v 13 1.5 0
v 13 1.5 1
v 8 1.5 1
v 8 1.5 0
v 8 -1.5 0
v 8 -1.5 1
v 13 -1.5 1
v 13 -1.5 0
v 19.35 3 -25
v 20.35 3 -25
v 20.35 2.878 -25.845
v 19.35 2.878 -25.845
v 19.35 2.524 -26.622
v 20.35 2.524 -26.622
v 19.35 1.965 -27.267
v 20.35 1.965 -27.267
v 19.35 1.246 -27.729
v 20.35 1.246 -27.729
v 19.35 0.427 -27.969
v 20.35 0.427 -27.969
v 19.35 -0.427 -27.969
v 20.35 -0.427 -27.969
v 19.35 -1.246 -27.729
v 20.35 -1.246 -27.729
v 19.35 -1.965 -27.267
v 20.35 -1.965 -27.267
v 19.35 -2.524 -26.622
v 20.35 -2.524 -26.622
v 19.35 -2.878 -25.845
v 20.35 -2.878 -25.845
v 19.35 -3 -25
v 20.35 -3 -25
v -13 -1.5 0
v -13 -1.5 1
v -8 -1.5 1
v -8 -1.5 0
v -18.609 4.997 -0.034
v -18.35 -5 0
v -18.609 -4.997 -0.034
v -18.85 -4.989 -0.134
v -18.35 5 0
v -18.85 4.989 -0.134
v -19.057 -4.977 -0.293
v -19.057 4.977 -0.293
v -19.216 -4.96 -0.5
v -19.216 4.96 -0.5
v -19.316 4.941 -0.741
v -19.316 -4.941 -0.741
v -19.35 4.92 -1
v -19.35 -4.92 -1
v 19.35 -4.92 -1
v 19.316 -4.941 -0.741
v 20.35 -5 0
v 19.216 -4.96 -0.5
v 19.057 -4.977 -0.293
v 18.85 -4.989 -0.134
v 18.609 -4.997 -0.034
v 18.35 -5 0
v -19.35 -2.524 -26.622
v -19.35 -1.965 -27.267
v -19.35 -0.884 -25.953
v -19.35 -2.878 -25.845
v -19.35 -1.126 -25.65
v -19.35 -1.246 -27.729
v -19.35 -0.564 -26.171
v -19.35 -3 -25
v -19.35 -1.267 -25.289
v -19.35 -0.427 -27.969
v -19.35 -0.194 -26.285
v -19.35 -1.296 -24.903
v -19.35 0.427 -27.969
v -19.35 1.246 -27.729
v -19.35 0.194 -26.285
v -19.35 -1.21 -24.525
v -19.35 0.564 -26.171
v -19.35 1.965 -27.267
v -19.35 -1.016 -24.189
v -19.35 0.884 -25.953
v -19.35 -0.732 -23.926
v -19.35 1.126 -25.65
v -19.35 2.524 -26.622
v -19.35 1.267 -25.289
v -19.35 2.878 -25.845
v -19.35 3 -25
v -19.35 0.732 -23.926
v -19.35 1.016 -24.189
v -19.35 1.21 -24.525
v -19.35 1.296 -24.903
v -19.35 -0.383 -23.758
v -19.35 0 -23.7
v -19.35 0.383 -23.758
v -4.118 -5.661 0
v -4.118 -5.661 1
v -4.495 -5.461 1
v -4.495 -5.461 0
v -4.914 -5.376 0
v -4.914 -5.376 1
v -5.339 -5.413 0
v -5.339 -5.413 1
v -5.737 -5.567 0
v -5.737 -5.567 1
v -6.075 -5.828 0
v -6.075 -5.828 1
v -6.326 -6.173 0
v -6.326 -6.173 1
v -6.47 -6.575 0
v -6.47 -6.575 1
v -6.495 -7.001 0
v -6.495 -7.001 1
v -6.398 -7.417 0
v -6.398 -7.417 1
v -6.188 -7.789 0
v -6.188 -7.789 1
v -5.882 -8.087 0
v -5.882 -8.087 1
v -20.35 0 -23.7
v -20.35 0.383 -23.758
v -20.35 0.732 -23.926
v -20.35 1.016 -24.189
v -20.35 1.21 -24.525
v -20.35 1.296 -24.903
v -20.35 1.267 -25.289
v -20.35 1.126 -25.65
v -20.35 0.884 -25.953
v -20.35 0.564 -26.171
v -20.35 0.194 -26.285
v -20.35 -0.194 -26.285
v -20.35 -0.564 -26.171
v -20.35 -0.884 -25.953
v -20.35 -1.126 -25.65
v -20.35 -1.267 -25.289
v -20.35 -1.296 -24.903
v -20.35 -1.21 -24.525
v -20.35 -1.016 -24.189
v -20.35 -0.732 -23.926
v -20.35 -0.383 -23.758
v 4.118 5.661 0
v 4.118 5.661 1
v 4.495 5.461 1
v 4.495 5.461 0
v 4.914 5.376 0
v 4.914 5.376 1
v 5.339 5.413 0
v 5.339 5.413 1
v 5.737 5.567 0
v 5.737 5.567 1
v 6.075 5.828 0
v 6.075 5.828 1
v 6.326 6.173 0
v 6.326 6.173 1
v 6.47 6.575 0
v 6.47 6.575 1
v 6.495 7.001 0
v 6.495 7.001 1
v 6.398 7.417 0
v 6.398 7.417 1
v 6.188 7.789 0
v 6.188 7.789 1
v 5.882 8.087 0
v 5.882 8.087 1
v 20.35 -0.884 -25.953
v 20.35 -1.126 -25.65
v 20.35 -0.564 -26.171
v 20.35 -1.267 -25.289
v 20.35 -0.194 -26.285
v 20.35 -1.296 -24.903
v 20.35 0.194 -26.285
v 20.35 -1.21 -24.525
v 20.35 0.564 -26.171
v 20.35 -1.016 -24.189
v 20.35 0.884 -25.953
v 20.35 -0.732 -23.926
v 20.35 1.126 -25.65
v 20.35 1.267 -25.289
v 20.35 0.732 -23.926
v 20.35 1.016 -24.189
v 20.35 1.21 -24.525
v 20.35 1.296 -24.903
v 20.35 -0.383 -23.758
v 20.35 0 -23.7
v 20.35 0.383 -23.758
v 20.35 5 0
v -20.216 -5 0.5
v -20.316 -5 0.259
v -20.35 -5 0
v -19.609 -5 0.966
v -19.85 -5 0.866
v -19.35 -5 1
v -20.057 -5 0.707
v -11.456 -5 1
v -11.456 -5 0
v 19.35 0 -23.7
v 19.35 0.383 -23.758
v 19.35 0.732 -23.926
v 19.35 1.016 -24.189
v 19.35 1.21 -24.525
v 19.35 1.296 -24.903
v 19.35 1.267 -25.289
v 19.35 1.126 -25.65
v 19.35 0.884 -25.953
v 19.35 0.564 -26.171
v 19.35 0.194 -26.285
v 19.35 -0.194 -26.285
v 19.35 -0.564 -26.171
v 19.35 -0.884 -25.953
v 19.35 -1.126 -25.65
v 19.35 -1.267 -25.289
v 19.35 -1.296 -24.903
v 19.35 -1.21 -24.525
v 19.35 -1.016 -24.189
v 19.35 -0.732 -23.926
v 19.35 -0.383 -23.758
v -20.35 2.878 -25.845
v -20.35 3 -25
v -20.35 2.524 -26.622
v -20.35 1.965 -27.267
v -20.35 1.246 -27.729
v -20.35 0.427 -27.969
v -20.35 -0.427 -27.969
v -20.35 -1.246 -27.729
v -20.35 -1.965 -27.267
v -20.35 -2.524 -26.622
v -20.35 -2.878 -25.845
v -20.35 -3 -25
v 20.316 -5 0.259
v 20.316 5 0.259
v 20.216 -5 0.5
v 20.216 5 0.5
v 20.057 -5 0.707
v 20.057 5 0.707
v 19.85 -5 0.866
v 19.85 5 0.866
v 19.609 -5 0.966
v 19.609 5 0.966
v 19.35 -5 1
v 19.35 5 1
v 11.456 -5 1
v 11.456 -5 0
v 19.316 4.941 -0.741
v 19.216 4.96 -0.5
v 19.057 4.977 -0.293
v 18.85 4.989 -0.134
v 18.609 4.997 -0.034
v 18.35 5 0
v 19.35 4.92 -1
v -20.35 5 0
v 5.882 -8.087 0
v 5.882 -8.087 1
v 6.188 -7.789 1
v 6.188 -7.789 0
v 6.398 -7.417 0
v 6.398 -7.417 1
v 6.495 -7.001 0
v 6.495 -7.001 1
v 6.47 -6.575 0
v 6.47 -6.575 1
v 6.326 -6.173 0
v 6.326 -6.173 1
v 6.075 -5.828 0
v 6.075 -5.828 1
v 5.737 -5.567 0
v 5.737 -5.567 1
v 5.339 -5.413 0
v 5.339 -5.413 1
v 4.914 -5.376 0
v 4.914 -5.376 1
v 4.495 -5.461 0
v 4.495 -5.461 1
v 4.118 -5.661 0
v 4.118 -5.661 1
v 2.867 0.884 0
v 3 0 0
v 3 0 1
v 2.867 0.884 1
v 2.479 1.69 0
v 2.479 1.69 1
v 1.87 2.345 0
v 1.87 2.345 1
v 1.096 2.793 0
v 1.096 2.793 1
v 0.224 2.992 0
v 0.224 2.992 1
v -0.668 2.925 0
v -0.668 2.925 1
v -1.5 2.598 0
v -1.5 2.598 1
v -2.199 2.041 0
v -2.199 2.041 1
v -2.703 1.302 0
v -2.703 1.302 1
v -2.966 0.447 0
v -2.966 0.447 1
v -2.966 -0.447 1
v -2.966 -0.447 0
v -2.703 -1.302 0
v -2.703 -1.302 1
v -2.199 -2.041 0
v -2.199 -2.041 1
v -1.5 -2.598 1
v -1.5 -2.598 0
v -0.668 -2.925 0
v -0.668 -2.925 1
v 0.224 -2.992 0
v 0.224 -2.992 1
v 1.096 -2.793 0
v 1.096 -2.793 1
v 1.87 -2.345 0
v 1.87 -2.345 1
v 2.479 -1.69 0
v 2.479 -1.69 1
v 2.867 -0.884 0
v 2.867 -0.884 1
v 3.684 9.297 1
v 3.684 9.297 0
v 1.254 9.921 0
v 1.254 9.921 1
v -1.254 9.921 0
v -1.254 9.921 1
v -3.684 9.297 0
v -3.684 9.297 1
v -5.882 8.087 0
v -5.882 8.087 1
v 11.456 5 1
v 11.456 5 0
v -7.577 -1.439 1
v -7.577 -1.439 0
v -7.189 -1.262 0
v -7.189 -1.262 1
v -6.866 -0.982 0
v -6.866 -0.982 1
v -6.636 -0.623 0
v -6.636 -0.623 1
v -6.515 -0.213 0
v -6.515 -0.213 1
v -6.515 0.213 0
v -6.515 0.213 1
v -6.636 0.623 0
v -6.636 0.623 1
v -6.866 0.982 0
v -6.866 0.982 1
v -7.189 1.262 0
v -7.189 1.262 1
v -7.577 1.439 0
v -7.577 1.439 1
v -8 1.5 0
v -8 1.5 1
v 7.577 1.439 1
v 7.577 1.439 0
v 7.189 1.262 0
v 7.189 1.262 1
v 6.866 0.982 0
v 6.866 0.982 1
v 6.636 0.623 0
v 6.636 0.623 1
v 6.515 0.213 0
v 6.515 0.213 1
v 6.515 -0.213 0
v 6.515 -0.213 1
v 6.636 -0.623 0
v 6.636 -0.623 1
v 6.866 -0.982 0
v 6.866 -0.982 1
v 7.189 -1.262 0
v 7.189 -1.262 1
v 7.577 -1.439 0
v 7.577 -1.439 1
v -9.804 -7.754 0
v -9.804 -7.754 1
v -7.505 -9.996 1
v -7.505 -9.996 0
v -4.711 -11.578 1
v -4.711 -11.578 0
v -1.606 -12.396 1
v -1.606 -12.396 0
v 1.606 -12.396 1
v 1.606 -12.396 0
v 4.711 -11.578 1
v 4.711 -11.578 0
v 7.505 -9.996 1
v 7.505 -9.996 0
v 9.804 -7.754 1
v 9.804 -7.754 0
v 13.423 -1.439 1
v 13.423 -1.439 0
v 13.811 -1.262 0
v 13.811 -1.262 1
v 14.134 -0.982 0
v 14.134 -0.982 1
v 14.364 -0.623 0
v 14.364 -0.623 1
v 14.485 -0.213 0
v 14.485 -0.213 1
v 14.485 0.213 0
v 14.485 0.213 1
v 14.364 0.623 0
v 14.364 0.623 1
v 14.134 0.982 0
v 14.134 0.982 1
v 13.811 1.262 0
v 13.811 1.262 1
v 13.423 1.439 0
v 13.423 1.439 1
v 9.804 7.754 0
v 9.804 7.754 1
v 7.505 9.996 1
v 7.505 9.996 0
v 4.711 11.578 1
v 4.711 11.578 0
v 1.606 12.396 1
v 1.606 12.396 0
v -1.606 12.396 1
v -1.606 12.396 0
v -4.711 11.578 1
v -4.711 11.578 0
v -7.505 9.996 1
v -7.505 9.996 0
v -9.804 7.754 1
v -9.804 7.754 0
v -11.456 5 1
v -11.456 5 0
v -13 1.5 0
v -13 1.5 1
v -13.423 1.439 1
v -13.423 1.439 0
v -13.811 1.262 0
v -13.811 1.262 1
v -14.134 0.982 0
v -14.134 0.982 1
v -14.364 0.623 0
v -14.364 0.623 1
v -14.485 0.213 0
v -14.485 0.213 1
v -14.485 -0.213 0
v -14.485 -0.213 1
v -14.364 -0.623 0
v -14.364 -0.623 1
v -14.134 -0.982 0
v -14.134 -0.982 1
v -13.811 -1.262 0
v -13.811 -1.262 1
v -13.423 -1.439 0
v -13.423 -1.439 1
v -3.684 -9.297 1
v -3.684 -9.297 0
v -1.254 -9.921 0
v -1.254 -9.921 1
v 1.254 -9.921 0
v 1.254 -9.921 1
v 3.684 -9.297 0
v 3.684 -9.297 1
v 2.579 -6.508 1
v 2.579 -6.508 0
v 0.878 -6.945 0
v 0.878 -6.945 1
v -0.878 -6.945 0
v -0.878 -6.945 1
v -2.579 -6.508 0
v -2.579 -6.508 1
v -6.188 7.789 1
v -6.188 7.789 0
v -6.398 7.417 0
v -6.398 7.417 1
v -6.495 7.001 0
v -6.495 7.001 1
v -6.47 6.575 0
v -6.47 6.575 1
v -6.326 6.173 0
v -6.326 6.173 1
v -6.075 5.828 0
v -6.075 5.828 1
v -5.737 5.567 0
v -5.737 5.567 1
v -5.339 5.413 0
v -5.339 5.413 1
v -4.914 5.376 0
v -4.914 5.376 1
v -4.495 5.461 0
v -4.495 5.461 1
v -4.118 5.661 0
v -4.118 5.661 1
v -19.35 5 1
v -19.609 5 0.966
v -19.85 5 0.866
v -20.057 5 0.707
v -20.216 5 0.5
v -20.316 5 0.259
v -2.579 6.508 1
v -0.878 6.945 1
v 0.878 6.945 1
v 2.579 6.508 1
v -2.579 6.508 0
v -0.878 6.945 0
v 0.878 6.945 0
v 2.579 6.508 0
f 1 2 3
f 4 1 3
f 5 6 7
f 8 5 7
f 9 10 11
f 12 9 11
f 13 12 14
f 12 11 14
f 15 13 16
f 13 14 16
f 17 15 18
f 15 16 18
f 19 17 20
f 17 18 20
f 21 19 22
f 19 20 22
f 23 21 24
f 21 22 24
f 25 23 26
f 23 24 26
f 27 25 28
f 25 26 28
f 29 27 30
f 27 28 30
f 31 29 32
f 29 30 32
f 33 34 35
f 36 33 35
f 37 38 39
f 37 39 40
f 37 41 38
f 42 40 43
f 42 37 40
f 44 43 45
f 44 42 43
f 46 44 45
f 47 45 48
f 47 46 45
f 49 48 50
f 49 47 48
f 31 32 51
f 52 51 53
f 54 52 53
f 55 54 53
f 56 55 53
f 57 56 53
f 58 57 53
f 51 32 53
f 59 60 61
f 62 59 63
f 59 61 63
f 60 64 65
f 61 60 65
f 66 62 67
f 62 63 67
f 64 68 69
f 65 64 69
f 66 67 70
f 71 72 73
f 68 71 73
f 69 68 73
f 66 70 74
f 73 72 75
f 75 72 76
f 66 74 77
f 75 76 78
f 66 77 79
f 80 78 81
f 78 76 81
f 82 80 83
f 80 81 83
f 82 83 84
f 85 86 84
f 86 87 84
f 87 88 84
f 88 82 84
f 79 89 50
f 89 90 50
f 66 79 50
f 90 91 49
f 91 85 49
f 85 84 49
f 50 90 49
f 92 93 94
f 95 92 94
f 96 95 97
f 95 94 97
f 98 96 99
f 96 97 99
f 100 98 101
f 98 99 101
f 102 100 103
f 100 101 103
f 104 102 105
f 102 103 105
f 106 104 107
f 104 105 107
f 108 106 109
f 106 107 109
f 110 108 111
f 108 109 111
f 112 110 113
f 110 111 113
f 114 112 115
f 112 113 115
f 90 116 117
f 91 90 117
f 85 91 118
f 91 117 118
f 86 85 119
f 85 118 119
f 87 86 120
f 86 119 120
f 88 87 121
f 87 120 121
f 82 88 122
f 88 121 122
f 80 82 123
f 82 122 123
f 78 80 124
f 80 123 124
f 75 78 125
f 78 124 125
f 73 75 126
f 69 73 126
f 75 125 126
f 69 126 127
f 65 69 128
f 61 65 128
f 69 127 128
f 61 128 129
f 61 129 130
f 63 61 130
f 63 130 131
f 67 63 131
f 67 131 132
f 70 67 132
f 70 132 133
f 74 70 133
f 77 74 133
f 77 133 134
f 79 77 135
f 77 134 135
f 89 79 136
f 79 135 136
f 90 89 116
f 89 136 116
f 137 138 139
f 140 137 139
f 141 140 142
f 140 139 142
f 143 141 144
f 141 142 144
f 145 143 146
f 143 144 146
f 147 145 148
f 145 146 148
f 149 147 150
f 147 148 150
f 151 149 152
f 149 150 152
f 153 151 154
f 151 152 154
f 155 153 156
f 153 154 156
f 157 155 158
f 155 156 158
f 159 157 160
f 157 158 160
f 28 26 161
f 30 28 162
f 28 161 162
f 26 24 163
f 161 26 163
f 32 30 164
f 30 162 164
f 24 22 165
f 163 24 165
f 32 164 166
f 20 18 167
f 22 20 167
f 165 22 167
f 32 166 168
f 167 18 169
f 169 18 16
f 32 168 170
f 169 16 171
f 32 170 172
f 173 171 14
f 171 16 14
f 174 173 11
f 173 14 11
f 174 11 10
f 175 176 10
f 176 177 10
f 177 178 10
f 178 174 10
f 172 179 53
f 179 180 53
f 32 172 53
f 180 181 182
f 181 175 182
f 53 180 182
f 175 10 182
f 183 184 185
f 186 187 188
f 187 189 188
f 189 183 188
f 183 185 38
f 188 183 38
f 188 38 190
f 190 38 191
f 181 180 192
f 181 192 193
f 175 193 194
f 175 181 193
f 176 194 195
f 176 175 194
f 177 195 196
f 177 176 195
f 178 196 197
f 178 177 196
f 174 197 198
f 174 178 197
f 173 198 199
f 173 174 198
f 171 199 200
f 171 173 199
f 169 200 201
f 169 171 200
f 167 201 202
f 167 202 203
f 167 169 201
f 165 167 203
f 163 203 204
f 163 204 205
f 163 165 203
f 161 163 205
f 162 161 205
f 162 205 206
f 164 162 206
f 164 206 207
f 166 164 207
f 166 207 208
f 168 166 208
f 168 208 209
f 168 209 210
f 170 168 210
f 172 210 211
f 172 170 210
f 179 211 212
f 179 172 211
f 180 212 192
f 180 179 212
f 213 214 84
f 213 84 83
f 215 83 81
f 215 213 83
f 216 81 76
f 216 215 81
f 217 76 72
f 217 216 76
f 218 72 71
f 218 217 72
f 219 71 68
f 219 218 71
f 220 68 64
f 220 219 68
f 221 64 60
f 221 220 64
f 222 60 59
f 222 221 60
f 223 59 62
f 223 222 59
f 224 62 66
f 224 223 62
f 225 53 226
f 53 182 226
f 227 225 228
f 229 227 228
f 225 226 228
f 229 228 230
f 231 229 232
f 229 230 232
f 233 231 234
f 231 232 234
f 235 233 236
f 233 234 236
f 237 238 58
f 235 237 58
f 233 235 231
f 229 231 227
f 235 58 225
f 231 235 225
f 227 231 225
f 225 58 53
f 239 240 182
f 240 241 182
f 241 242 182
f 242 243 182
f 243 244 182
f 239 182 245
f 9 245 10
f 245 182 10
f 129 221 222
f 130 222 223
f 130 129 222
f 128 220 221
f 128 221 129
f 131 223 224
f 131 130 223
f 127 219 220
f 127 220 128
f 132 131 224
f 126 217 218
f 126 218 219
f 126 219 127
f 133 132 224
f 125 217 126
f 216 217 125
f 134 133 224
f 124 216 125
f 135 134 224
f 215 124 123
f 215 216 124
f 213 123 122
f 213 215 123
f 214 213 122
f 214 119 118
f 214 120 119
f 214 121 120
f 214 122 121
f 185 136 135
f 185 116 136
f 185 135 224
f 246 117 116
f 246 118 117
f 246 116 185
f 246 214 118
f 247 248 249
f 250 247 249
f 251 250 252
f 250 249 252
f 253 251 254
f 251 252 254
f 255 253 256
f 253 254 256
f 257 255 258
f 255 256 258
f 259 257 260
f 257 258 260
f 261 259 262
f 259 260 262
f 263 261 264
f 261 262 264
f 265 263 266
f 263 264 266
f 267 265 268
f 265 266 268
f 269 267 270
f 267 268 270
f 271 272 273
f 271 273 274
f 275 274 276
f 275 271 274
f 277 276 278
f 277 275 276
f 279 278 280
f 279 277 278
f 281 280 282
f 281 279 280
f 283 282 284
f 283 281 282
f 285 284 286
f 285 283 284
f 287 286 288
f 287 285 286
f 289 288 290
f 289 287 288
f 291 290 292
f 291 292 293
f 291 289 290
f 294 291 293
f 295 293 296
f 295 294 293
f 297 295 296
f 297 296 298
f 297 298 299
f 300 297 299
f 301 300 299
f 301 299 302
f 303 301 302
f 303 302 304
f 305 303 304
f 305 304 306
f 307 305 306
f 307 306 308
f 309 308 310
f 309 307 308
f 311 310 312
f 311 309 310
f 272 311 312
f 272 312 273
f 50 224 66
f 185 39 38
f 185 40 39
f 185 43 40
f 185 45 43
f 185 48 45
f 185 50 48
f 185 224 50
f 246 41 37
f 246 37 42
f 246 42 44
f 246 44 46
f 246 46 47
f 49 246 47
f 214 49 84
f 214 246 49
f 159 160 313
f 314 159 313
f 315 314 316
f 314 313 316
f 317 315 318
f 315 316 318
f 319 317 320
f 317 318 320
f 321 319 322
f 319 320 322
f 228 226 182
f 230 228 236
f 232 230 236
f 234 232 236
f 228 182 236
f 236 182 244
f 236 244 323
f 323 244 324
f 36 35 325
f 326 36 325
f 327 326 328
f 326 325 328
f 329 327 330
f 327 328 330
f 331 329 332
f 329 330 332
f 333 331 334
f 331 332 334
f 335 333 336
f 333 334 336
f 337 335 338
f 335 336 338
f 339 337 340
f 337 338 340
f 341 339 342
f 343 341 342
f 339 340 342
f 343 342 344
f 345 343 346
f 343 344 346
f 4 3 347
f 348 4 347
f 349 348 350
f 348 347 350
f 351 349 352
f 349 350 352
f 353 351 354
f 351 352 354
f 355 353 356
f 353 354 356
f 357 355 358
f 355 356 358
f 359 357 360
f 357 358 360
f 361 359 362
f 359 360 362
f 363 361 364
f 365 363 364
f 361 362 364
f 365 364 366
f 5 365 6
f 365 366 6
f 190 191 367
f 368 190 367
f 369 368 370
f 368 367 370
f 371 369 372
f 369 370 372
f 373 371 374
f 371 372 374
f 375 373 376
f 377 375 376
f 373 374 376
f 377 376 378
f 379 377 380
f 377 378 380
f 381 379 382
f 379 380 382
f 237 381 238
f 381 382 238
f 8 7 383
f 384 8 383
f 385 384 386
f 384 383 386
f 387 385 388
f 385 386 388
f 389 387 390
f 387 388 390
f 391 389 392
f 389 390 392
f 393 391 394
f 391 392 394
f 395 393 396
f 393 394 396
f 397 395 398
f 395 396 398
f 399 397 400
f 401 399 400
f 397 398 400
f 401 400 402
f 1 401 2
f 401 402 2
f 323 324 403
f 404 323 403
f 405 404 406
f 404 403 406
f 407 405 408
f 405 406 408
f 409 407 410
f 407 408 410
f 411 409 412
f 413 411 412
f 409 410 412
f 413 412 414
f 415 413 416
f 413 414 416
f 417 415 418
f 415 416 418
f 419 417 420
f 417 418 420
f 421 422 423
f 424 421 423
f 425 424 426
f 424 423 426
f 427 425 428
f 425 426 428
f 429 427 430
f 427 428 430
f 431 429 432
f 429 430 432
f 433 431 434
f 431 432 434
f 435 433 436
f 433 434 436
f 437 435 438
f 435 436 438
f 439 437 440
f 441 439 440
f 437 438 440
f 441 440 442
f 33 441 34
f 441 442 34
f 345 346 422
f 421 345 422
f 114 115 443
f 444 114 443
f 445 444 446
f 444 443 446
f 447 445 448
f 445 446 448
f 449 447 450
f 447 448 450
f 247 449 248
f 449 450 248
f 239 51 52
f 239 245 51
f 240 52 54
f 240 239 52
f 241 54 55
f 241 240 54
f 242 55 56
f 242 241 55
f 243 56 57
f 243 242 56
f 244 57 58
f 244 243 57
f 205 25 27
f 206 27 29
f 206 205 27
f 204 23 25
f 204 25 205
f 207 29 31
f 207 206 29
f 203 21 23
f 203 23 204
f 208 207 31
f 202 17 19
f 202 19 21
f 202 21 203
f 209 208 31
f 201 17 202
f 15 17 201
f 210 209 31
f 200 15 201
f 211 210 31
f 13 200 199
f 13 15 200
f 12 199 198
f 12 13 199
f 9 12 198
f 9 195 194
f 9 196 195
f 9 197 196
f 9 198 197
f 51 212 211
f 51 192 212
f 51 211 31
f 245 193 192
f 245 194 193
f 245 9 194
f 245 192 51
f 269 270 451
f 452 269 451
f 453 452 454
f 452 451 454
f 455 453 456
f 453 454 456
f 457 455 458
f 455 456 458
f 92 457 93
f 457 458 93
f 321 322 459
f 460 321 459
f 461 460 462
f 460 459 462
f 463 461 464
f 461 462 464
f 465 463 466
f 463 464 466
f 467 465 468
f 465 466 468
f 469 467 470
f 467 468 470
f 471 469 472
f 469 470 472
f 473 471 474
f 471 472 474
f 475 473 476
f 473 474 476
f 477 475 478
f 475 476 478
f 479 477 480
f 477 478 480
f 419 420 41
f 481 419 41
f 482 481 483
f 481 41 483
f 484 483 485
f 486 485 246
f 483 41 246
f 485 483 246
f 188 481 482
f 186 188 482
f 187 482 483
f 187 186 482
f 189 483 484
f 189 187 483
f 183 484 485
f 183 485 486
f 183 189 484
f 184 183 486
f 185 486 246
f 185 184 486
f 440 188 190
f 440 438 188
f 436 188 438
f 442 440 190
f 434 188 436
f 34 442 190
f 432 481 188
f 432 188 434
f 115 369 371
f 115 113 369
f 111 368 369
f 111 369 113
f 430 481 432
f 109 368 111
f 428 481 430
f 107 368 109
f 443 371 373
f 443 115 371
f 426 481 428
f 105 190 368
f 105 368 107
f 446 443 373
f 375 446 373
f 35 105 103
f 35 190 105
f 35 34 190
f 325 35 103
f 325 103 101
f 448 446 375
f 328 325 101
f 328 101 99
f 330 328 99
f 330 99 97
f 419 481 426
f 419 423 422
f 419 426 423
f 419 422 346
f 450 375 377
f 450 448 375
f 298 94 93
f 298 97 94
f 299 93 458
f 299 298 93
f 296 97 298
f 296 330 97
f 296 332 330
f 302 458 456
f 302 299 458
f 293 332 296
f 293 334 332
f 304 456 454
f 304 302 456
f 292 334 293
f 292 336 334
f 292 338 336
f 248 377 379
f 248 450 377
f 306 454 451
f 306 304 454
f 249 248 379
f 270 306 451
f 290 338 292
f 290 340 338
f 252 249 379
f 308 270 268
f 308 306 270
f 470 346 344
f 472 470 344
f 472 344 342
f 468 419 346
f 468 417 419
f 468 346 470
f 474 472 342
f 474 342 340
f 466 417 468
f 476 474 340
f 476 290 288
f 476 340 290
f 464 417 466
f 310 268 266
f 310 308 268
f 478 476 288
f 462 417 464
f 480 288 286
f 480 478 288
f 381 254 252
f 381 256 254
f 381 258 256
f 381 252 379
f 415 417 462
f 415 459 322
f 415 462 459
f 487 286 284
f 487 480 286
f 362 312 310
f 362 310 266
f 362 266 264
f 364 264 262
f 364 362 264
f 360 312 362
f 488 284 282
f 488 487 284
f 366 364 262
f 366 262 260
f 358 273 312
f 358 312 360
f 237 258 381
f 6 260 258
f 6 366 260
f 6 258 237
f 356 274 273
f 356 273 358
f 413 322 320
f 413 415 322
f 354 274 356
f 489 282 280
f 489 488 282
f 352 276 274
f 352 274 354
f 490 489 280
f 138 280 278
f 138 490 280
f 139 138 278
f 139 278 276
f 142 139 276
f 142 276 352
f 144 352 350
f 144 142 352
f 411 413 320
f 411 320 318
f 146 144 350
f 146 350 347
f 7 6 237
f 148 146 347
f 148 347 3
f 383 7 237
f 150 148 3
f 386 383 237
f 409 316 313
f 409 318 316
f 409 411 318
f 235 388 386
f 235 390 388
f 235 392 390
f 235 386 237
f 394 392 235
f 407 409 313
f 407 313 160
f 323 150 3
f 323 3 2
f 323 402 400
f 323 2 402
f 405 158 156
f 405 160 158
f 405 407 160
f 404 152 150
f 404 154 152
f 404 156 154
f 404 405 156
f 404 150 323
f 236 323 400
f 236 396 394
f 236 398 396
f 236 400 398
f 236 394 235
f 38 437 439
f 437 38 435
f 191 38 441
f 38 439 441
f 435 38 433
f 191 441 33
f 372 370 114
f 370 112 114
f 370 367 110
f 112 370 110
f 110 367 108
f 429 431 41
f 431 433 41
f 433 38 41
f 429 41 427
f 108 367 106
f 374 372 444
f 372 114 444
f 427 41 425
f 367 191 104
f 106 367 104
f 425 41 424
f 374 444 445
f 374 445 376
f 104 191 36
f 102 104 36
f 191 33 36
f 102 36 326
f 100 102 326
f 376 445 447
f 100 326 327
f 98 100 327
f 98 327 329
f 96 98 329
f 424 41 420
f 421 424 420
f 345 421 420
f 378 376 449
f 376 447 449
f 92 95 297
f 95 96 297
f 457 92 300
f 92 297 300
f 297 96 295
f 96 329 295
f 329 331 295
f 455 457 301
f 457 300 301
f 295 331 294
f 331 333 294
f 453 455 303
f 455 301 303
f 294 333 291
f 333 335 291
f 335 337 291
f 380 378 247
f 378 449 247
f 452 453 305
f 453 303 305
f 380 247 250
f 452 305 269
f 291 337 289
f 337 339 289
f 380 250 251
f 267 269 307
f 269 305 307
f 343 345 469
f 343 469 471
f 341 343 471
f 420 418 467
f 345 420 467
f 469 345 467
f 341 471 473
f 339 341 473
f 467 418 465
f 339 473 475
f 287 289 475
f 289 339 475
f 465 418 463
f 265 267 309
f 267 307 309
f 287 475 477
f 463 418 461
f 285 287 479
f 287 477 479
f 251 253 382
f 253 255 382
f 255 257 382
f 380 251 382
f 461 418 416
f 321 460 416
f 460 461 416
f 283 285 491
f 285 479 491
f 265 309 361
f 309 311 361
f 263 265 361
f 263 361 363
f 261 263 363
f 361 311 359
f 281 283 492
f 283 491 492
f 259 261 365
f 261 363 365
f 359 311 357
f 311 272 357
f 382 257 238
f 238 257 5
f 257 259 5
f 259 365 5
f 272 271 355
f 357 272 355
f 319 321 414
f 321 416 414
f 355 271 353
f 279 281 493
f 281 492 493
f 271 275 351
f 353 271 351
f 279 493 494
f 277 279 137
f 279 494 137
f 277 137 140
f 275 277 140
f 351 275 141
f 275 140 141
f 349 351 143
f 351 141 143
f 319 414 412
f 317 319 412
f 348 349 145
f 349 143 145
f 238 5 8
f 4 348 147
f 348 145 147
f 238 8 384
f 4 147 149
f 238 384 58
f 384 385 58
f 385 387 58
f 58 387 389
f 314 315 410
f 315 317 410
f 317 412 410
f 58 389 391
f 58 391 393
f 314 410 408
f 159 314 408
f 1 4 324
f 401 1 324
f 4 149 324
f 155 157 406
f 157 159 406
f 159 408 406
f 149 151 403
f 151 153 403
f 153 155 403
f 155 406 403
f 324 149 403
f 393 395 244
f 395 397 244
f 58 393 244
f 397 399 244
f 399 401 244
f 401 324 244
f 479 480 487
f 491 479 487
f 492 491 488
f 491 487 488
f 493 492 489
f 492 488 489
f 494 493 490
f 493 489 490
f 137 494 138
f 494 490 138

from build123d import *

# Parameters (mm, degrees)
SKETCH1_R           = 3
BOSS_EXTRUDE1_DEPTH = 1
SKETCH2_R           = 1.3
BOSS_EXTRUDE2_DEPTH = 1
FILLET1_R           = 1
CUT_EXTRUDE1_DEPTH  = 1


with BuildPart() as part:
    # Sketch1 → Boss-Extrude1 (new body)
    with BuildSketch(Plane.XY):
        with BuildLine():
            ThreePointArc((11.456439237, 5), (0, 12.5), (-11.456439237, 5))
            Line((-11.456439237, 5), (11.456439237, 5))
        make_face()
        with BuildLine():
            Line((11.456439237, 5), (-11.456439237, 5))
            ThreePointArc((-11.456439237, 5), (-12.5, 0), (-11.456439237, -5))
            Line((-11.456439237, -5), (11.456439237, -5))
            ThreePointArc((11.456439237, -5), (12.236328912, -2.553870546), (12.5, 0))
            ThreePointArc((12.5, 0), (12.236328912, 2.553870546), (11.456439237, 5))
        make_face()
        Circle(SKETCH1_R, mode=Mode.SUBTRACT)
        with BuildLine():
            Line((20.35, 5), (11.456439237, 5))
            ThreePointArc((11.456439237, 5), (12.236328912, 2.553870546), (12.5, 0))
            ThreePointArc((12.5, 0), (12.236328912, -2.553870546), (11.456439237, -5))
            Line((11.456439237, -5), (20.35, -5))
            Line((20.35, -5), (20.35, 5))
        make_face()
        with BuildLine():
            Line((-11.456439237, 5), (-20.35, 5))
            Line((-20.35, 5), (-20.35, -5))
            Line((-20.35, -5), (-11.456439237, -5))
            ThreePointArc((-11.456439237, -5), (-12.5, 0), (-11.456439237, 5))
        make_face()
        with BuildLine():
            Line((11.456439237, -5), (-11.456439237, -5))
            ThreePointArc((-11.456439237, -5), (0, -12.5), (11.456439237, -5))
        make_face()
    extrude(amount=BOSS_EXTRUDE1_DEPTH)

    # Sketch2 → Boss-Extrude2 (add)
    with BuildSketch(Plane.ZY.offset(20.35)):
        with BuildLine():
            Line((-25, -3), (0, -5))
            Line((0, -5), (0, 5))
            Line((0, 5), (-25, 3))
            ThreePointArc((-25, 3), (-28, 0), (-25, -3))
        make_face()
        with Locations((-25, 0)):
            Circle(SKETCH2_R, mode=Mode.SUBTRACT)
    boss_extrude2 = extrude(amount=-BOSS_EXTRUDE2_DEPTH)

    # Mirror1: Boss-Extrude2 across plane
    add(boss_extrude2.mirror(Plane.ZY))

    # Fillet1
    fillet1_edges = [part.edges().sort_by_distance(p)[0] for p in [
        (20.35, 0, 1),
        (-20.35, 0, 1),
        (19.35, 0, 0),
        (-19.35, 0, 0),
    ]]
    fillet(fillet1_edges, radius=FILLET1_R)

    # Sketch3 → Cut-Extrude1 (cut)
    with BuildSketch(Plane.XY.offset(1)):
        with BuildLine():
            ThreePointArc((8, 1.5), (6.5, 0), (8, -1.5))
            Line((8, -1.5), (13, -1.5))
            ThreePointArc((13, -1.5), (14.5, 0), (13, 1.5))
            Line((13, 1.5), (8, 1.5))
        make_face()
        with BuildLine():
            ThreePointArc((-4.117647107, 5.660828765), (-1.9e-08, 7), (4.117647076, 5.660828787))
            ThreePointArc((4.117647076, 5.660828787), (6.213034752, 5.991510614), (5.882352933, 8.086898291))
            ThreePointArc((5.882352933, 8.086898291), (6e-09, 10), (-5.882352923, 8.086898298))
            ThreePointArc((-5.882352923, 8.086898298), (-6.213034767, 5.991510634), (-4.117647107, 5.660828765))
        make_face()
        with BuildLine():
            ThreePointArc((4.117647035, -5.660828817), (-2.5e-08, -7), (-4.117647076, -5.660828787))
            ThreePointArc((-4.117647076, -5.660828787), (-6.213034774, -5.991510645), (-5.882352871, -8.086898336))
            ThreePointArc((-5.882352871, -8.086898336), (7.8e-08, -10), (5.882352997, -8.086898245))
            ThreePointArc((5.882352997, -8.086898245), (6.213034714, -5.991510562), (4.117647035, -5.660828817))
        make_face()
        with BuildLine():
            ThreePointArc((-8, -1.5), (-6.5, 0), (-8, 1.5))
            Line((-8, 1.5), (-13, 1.5))
            ThreePointArc((-13, 1.5), (-14.5, 0), (-13, -1.5))
            Line((-13, -1.5), (-8, -1.5))
        make_face()
    extrude(amount=-CUT_EXTRUDE1_DEPTH, mode=Mode.SUBTRACT)


solid = part.part
